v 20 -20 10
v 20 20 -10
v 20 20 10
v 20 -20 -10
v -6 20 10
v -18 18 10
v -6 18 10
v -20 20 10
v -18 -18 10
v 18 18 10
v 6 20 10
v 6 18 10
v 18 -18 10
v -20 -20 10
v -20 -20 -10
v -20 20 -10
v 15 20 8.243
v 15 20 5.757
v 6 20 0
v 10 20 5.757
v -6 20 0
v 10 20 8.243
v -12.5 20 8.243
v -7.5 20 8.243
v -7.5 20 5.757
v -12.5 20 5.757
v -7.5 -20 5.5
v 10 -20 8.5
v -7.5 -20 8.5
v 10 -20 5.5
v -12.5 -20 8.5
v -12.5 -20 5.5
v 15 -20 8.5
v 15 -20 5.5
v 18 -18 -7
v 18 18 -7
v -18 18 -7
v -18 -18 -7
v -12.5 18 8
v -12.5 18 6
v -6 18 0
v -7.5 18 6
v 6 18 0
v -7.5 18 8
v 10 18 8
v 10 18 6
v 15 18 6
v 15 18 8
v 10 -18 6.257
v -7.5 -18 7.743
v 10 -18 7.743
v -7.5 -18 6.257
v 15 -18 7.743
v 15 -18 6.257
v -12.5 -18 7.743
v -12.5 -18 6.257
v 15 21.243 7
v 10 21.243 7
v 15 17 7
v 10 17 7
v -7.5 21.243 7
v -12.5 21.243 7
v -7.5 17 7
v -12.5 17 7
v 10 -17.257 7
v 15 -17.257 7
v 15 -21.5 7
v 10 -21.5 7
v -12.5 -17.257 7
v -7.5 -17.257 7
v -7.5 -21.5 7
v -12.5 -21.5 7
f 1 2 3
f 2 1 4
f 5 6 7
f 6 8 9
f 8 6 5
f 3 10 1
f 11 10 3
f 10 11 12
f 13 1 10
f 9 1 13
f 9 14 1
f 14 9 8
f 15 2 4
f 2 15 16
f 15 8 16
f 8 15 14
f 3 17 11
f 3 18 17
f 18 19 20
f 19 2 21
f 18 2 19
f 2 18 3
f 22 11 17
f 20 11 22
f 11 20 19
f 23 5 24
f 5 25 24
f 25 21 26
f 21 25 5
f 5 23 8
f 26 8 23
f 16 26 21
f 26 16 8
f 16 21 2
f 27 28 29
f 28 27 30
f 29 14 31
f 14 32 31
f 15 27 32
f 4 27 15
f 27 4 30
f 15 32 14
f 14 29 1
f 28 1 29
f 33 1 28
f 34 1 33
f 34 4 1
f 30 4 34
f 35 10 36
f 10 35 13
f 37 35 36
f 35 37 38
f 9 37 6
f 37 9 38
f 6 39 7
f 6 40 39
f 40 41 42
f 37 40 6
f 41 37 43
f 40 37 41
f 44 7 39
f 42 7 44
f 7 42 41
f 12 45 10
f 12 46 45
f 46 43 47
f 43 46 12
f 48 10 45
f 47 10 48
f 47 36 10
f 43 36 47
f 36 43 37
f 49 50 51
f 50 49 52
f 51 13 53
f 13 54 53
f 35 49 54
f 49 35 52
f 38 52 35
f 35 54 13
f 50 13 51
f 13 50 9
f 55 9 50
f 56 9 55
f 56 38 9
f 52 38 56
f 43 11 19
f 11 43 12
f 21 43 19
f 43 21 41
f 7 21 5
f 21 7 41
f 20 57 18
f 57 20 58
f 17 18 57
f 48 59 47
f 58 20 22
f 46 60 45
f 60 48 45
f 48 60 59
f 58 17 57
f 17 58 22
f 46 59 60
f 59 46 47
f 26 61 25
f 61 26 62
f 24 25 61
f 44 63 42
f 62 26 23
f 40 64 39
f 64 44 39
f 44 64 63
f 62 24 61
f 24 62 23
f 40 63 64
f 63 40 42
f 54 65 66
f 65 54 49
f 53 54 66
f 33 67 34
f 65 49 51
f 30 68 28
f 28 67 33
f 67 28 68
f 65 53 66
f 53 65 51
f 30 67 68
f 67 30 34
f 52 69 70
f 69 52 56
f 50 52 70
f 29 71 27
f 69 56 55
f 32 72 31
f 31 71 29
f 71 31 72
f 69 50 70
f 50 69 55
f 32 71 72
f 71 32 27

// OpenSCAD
OUTER_WIDTH = 40;
WALL_THICKNESS = 2;

inner_width = OUTER_WIDTH -(WALL_THICKNESS*2);
difference(){
    difference(){
        cube([OUTER_WIDTH,OUTER_WIDTH,OUTER_WIDTH/2],center=true);
        translate([0,0,WALL_THICKNESS]){
            cube([inner_width,inner_width,inner_width/2],center=true);
        }
    }
    translate([0,OUTER_WIDTH/2,(OUTER_WIDTH/2)-10]){
        cube([12,5,20],center=true);
    }
}


module catch(){
    rotate(45,[1,0,0]){
        rotate(90,[0,1,0]){
            cube([3,3,5]);
        }
    }
}

translate([10,(OUTER_WIDTH/2)-3,(OUTER_WIDTH/4)-3]){
    catch();
}
translate([-10-2.5,(OUTER_WIDTH/2)-3,(OUTER_WIDTH/4)-3]){
    catch();
}

translate([10,(-OUTER_WIDTH/2)-1.5,(OUTER_WIDTH/4)-3]){
    catch();
}
translate([-10-2.5,(-OUTER_WIDTH/2)-1.5,(OUTER_WIDTH/4)-3]){
    catch();
}
